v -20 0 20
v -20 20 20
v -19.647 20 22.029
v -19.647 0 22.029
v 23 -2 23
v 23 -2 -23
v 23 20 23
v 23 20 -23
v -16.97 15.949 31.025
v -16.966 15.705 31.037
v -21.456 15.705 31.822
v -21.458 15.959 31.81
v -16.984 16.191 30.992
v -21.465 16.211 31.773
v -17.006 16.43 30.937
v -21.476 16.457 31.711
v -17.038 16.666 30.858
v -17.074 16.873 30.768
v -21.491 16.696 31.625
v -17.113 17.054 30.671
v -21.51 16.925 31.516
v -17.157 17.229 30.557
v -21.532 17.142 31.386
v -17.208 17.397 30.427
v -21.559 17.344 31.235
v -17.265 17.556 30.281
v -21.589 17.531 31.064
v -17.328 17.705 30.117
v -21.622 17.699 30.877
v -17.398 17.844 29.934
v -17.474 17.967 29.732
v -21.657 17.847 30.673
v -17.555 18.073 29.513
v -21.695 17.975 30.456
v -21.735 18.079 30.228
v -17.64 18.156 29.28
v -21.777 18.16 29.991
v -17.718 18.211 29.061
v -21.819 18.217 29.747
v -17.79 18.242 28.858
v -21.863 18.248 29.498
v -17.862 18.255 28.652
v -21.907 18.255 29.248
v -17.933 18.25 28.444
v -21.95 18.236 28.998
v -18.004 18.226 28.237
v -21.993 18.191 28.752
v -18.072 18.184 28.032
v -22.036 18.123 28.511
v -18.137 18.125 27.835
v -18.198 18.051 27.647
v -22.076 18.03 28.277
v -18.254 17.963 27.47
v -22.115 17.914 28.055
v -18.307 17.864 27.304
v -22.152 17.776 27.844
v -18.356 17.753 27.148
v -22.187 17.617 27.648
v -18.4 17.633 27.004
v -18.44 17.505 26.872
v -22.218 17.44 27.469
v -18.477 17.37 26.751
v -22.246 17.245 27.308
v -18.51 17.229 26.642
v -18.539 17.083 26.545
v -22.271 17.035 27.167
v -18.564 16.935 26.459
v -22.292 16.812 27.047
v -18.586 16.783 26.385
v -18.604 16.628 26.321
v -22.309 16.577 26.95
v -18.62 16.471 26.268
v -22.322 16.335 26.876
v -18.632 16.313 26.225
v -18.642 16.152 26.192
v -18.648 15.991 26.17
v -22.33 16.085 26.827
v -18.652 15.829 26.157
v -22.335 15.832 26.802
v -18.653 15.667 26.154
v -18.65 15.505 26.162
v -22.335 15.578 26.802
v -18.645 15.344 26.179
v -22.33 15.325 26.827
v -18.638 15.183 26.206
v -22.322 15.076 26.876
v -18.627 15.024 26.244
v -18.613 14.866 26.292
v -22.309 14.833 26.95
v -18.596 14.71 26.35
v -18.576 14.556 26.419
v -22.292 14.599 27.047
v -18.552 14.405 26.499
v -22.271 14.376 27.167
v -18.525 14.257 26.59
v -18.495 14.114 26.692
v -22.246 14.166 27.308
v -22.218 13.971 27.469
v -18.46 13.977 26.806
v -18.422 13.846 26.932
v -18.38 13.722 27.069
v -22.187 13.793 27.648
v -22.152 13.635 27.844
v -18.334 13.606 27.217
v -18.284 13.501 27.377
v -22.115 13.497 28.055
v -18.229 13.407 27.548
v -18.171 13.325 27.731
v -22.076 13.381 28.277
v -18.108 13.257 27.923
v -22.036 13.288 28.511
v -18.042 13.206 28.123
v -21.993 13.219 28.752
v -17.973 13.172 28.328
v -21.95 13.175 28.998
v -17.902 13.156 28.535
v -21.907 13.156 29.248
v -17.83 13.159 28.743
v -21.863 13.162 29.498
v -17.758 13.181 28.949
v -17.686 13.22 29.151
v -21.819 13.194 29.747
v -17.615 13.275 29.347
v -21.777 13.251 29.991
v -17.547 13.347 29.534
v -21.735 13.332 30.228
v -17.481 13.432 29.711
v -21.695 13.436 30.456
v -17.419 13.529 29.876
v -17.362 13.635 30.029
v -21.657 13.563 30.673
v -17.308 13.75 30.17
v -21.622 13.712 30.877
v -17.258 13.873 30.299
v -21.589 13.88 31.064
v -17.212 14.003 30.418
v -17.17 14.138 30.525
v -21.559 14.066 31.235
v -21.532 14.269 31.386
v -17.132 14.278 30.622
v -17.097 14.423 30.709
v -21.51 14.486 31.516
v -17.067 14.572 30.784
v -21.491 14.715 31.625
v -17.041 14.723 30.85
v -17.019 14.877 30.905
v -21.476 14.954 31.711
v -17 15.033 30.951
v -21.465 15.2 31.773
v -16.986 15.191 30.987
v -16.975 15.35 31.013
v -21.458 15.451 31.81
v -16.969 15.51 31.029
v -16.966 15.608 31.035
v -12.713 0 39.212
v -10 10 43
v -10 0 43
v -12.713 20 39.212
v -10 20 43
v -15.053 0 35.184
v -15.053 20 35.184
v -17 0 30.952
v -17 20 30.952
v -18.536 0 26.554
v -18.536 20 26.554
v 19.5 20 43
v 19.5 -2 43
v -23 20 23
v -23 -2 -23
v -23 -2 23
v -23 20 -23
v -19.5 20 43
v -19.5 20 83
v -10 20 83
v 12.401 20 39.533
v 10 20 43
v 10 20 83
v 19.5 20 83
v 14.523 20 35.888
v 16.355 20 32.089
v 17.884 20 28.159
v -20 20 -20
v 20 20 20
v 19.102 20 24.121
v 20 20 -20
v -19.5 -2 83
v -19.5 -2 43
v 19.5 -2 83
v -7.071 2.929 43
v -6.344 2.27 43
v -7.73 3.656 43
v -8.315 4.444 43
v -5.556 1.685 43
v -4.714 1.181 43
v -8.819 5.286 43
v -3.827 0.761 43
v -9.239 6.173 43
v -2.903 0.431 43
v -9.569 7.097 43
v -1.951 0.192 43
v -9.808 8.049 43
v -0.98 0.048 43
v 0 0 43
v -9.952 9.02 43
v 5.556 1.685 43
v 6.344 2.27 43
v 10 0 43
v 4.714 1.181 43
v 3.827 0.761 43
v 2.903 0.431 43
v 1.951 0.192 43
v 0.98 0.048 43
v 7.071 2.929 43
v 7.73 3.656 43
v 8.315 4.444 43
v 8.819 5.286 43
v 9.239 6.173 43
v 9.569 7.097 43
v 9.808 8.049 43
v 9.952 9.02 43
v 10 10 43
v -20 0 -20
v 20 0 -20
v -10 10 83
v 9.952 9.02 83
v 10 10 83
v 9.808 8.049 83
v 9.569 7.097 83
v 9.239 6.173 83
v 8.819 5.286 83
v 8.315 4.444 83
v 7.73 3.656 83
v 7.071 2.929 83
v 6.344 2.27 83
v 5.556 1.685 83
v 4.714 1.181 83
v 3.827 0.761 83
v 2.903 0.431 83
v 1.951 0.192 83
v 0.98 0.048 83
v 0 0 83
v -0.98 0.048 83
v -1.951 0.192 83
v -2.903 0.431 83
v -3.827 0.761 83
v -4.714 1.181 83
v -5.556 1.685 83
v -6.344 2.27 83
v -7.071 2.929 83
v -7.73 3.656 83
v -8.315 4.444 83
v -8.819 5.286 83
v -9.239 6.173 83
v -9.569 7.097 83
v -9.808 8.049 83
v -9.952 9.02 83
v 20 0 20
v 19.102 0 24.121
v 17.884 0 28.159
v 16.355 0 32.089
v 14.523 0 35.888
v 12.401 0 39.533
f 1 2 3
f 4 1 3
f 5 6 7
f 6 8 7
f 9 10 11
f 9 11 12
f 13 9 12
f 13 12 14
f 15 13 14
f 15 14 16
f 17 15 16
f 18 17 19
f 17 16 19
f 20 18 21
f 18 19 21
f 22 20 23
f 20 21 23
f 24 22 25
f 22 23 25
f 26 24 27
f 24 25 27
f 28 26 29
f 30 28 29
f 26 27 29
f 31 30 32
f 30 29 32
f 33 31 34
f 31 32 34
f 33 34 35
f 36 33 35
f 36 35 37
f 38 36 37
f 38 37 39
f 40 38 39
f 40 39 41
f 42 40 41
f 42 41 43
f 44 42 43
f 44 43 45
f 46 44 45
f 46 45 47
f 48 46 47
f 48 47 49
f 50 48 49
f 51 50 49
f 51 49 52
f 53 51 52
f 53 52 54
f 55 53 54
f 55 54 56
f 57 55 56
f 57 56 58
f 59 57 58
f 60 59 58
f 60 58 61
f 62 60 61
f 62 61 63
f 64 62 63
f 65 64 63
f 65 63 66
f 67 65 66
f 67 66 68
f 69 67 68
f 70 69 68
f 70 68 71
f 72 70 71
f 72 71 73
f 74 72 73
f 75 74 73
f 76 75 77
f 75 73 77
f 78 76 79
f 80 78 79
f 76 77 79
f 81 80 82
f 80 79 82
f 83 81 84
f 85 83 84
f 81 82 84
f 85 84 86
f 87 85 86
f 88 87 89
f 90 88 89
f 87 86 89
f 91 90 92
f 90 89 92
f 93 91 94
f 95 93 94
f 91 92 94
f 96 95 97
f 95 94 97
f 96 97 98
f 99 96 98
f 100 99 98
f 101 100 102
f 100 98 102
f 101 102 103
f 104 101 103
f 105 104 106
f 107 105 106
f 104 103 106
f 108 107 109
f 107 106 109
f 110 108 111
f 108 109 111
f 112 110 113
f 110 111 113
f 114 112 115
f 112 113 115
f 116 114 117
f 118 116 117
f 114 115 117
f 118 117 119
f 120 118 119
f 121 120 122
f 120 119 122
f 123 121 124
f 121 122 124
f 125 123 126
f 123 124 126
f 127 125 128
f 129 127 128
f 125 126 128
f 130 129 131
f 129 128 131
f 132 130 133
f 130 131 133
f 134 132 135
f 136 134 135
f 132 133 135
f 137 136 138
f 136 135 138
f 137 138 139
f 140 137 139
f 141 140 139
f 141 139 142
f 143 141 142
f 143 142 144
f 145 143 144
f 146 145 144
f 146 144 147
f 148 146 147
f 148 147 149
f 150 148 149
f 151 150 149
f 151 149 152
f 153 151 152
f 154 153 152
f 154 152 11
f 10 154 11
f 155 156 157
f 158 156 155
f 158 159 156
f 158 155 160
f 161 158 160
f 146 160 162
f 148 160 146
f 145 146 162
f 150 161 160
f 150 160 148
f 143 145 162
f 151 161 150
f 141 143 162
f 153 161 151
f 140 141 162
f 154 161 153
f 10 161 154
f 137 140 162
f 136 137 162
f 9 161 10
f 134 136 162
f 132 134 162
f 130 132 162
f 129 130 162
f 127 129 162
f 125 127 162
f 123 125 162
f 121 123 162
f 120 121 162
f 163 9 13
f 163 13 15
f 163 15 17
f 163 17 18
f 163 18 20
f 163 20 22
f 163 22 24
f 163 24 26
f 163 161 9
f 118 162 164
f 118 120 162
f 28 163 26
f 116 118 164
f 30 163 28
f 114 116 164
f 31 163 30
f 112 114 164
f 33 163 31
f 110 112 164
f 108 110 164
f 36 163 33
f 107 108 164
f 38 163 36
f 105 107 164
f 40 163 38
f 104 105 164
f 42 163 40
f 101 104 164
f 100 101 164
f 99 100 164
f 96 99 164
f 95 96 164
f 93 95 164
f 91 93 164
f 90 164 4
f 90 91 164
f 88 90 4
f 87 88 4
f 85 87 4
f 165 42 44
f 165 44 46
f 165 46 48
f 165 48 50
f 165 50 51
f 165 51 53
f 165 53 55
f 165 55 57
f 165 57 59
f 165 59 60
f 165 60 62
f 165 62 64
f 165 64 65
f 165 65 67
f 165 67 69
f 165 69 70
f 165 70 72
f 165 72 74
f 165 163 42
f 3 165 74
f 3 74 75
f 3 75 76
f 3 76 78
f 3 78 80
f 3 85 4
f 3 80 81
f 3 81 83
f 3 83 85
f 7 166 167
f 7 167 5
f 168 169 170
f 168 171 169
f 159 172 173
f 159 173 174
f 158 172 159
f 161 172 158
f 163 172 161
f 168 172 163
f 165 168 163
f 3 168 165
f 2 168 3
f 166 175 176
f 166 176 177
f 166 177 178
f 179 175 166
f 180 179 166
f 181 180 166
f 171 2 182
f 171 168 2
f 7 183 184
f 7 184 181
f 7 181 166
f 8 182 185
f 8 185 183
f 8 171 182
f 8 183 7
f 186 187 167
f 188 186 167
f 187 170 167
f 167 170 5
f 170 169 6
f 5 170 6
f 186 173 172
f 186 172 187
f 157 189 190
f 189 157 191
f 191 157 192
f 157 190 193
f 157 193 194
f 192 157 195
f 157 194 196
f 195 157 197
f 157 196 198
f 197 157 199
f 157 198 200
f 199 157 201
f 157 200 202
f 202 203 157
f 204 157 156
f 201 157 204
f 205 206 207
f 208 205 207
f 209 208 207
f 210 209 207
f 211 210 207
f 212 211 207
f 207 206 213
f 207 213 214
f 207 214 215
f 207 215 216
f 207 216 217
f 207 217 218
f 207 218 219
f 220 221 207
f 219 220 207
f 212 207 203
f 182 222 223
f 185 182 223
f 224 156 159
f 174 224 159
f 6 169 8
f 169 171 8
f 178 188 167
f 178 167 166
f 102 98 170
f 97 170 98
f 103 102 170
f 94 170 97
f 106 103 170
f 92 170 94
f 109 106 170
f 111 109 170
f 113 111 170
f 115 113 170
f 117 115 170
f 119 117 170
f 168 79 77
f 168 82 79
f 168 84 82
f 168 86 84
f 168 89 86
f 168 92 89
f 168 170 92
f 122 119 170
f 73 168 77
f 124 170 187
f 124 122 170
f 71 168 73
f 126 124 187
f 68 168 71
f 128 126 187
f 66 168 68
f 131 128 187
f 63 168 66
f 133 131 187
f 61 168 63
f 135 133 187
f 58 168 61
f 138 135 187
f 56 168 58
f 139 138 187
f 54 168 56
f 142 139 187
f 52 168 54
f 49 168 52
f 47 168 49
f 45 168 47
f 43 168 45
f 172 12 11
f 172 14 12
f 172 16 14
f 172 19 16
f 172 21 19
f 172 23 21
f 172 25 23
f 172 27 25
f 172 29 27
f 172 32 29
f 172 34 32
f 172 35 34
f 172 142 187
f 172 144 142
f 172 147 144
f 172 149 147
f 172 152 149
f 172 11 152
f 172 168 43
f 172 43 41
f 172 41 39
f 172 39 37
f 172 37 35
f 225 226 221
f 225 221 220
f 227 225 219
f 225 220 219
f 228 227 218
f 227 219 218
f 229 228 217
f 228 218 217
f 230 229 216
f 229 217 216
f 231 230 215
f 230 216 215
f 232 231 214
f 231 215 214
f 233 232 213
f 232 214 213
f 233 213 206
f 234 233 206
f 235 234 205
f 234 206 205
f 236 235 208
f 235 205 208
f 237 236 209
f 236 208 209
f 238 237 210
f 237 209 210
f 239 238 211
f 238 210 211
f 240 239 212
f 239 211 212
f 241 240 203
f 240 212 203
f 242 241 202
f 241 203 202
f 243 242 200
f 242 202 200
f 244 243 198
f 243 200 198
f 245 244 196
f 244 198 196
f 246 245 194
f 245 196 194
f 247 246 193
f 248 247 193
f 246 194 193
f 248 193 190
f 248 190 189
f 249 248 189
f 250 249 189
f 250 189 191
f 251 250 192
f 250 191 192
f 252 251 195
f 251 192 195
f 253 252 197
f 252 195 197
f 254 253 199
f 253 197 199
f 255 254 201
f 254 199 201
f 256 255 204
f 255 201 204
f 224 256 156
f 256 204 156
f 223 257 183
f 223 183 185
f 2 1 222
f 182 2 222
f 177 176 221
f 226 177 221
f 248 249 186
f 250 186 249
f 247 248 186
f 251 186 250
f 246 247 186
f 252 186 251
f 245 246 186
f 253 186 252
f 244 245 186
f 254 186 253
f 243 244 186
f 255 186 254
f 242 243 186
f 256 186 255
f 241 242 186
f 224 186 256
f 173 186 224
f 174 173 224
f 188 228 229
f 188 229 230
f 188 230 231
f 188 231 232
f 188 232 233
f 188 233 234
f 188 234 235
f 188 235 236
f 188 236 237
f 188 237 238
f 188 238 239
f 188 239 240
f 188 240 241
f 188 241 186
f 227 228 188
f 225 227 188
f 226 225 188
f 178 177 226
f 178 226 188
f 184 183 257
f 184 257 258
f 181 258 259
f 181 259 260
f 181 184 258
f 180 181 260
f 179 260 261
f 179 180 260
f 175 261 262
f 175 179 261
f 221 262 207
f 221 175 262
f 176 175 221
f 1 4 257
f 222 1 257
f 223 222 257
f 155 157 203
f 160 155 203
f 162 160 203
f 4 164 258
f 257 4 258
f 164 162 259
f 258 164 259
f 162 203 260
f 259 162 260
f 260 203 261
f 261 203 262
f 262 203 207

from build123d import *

# Parameters (mm, degrees)
SKETCH1_W           = 46
SKETCH1_H           = 46
SKETCH1_W_2         = 40
SKETCH1_H_2         = 40
BOSS_EXTRUDE1_DEPTH = 20
SKETCH2_W           = 46
SKETCH2_H           = 46
BOSS_EXTRUDE2_DEPTH = 2
BOSS_EXTRUDE3_DEPTH = 22
CUT_EXTRUDE1_DEPTH  = 20
BOSS_EXTRUDE5_DEPTH = 2
BOSS_EXTRUDE6_DEPTH = 40
BOSS_EXTRUDE8_DEPTH = 20
SKETCH12_R          = 2.55
CUT_EXTRUDE4_DEPTH  = 20


with BuildPart() as part:
    # Sketch1 → Boss-Extrude1 (new body)
    with BuildSketch(Plane(origin=(0, 0, 0), x_dir=(1, 0, 0), z_dir=(0, 1, 0))):
        Rectangle(SKETCH1_W, SKETCH1_H)
        Rectangle(SKETCH1_W_2, SKETCH1_H_2, mode=Mode.SUBTRACT)
    extrude(amount=BOSS_EXTRUDE1_DEPTH)

    # Sketch2 → Boss-Extrude2 (add)
    with BuildSketch(Plane.XZ):
        Rectangle(SKETCH2_W, SKETCH2_H)
    extrude(amount=BOSS_EXTRUDE2_DEPTH)

    # Sketch3 → Boss-Extrude3 (add)
    with BuildSketch(Plane(origin=(0, 20, 0), x_dir=(1, 0, 0), z_dir=(0, 1, 0))):
        Polygon((-16, -43), (-19.47826087, -23), (-23, -23), (-19.5, -43), align=None)
        Polygon((23, -23), (19.47826087, -23), (16, -43), (19.5, -43), align=None)
    extrude(amount=-BOSS_EXTRUDE3_DEPTH)

    # Sketch3<3> → Cut-Extrude1 (cut)
    with BuildSketch(Plane(origin=(0, 20, 0), x_dir=(1, 0, 0), z_dir=(0, 1, 0))):
        Polygon((20, -20), (-20, -20), (-19.47826087, -23), (19.47826087, -23), align=None)
    extrude(amount=-CUT_EXTRUDE1_DEPTH, mode=Mode.SUBTRACT)

    # Sketch5 → Boss-Extrude5 (add)
    with BuildSketch(Plane.XZ.offset(2)):
        Polygon((-16, 43), (-19.47826087, 23), (19.47826087, 23), (16, 43), align=None)
    extrude(amount=-BOSS_EXTRUDE5_DEPTH)

    # Sketch6 → Boss-Extrude6 (add)
    with BuildSketch(Plane.XY.offset(43)):
        with BuildLine():
            Line((-10, 10), (-10, 20))
            Line((-10, 20), (-19.5, 20))
            Line((-19.5, 20), (-19.5, -2))
            Line((-19.5, -2), (19.5, -2))
            Line((19.5, -2), (19.5, 20))
            Line((19.5, 20), (10, 20))
            Line((10, 20), (10, 10))
            ThreePointArc((10, 10), (0, 0), (-10, 10))
        make_face()
    extrude(amount=BOSS_EXTRUDE6_DEPTH)

    # Sketch10 → Boss-Extrude8 (add)
    with BuildSketch(Plane(origin=(0, 20, 0), x_dir=(1, 0, 0), z_dir=(0, 1, 0))):
        with BuildLine():
            ThreePointArc((-10, -43), (-16.076894226, -33.091178776), (-19.647093187, -22.029214175))
            Line((-19.647093187, -22.029214175), (-16, -43))
            Line((-16, -43), (-10, -43))
        make_face()
        with BuildLine():
            Line((16, -43), (20, -20))
            ThreePointArc((20, -20), (16.354828561, -32.089055896), (10, -43))
            Line((10, -43), (16, -43))
        make_face()
    extrude(amount=-BOSS_EXTRUDE8_DEPTH)

    # Sketch12 → Cut-Extrude4 (cut)
    with BuildSketch(Plane(origin=(-26.221952699, 0, 4.588841722), x_dir=(0.17238033175224893, 0, 0.9850304671557041), z_dir=(-0.9850304671557042, 0, 0.17238033175224893))):
        with Locations((25.097340794, 15.70534694)):
            Circle(SKETCH12_R)
    extrude(amount=-CUT_EXTRUDE4_DEPTH, mode=Mode.SUBTRACT)


solid = part.part
